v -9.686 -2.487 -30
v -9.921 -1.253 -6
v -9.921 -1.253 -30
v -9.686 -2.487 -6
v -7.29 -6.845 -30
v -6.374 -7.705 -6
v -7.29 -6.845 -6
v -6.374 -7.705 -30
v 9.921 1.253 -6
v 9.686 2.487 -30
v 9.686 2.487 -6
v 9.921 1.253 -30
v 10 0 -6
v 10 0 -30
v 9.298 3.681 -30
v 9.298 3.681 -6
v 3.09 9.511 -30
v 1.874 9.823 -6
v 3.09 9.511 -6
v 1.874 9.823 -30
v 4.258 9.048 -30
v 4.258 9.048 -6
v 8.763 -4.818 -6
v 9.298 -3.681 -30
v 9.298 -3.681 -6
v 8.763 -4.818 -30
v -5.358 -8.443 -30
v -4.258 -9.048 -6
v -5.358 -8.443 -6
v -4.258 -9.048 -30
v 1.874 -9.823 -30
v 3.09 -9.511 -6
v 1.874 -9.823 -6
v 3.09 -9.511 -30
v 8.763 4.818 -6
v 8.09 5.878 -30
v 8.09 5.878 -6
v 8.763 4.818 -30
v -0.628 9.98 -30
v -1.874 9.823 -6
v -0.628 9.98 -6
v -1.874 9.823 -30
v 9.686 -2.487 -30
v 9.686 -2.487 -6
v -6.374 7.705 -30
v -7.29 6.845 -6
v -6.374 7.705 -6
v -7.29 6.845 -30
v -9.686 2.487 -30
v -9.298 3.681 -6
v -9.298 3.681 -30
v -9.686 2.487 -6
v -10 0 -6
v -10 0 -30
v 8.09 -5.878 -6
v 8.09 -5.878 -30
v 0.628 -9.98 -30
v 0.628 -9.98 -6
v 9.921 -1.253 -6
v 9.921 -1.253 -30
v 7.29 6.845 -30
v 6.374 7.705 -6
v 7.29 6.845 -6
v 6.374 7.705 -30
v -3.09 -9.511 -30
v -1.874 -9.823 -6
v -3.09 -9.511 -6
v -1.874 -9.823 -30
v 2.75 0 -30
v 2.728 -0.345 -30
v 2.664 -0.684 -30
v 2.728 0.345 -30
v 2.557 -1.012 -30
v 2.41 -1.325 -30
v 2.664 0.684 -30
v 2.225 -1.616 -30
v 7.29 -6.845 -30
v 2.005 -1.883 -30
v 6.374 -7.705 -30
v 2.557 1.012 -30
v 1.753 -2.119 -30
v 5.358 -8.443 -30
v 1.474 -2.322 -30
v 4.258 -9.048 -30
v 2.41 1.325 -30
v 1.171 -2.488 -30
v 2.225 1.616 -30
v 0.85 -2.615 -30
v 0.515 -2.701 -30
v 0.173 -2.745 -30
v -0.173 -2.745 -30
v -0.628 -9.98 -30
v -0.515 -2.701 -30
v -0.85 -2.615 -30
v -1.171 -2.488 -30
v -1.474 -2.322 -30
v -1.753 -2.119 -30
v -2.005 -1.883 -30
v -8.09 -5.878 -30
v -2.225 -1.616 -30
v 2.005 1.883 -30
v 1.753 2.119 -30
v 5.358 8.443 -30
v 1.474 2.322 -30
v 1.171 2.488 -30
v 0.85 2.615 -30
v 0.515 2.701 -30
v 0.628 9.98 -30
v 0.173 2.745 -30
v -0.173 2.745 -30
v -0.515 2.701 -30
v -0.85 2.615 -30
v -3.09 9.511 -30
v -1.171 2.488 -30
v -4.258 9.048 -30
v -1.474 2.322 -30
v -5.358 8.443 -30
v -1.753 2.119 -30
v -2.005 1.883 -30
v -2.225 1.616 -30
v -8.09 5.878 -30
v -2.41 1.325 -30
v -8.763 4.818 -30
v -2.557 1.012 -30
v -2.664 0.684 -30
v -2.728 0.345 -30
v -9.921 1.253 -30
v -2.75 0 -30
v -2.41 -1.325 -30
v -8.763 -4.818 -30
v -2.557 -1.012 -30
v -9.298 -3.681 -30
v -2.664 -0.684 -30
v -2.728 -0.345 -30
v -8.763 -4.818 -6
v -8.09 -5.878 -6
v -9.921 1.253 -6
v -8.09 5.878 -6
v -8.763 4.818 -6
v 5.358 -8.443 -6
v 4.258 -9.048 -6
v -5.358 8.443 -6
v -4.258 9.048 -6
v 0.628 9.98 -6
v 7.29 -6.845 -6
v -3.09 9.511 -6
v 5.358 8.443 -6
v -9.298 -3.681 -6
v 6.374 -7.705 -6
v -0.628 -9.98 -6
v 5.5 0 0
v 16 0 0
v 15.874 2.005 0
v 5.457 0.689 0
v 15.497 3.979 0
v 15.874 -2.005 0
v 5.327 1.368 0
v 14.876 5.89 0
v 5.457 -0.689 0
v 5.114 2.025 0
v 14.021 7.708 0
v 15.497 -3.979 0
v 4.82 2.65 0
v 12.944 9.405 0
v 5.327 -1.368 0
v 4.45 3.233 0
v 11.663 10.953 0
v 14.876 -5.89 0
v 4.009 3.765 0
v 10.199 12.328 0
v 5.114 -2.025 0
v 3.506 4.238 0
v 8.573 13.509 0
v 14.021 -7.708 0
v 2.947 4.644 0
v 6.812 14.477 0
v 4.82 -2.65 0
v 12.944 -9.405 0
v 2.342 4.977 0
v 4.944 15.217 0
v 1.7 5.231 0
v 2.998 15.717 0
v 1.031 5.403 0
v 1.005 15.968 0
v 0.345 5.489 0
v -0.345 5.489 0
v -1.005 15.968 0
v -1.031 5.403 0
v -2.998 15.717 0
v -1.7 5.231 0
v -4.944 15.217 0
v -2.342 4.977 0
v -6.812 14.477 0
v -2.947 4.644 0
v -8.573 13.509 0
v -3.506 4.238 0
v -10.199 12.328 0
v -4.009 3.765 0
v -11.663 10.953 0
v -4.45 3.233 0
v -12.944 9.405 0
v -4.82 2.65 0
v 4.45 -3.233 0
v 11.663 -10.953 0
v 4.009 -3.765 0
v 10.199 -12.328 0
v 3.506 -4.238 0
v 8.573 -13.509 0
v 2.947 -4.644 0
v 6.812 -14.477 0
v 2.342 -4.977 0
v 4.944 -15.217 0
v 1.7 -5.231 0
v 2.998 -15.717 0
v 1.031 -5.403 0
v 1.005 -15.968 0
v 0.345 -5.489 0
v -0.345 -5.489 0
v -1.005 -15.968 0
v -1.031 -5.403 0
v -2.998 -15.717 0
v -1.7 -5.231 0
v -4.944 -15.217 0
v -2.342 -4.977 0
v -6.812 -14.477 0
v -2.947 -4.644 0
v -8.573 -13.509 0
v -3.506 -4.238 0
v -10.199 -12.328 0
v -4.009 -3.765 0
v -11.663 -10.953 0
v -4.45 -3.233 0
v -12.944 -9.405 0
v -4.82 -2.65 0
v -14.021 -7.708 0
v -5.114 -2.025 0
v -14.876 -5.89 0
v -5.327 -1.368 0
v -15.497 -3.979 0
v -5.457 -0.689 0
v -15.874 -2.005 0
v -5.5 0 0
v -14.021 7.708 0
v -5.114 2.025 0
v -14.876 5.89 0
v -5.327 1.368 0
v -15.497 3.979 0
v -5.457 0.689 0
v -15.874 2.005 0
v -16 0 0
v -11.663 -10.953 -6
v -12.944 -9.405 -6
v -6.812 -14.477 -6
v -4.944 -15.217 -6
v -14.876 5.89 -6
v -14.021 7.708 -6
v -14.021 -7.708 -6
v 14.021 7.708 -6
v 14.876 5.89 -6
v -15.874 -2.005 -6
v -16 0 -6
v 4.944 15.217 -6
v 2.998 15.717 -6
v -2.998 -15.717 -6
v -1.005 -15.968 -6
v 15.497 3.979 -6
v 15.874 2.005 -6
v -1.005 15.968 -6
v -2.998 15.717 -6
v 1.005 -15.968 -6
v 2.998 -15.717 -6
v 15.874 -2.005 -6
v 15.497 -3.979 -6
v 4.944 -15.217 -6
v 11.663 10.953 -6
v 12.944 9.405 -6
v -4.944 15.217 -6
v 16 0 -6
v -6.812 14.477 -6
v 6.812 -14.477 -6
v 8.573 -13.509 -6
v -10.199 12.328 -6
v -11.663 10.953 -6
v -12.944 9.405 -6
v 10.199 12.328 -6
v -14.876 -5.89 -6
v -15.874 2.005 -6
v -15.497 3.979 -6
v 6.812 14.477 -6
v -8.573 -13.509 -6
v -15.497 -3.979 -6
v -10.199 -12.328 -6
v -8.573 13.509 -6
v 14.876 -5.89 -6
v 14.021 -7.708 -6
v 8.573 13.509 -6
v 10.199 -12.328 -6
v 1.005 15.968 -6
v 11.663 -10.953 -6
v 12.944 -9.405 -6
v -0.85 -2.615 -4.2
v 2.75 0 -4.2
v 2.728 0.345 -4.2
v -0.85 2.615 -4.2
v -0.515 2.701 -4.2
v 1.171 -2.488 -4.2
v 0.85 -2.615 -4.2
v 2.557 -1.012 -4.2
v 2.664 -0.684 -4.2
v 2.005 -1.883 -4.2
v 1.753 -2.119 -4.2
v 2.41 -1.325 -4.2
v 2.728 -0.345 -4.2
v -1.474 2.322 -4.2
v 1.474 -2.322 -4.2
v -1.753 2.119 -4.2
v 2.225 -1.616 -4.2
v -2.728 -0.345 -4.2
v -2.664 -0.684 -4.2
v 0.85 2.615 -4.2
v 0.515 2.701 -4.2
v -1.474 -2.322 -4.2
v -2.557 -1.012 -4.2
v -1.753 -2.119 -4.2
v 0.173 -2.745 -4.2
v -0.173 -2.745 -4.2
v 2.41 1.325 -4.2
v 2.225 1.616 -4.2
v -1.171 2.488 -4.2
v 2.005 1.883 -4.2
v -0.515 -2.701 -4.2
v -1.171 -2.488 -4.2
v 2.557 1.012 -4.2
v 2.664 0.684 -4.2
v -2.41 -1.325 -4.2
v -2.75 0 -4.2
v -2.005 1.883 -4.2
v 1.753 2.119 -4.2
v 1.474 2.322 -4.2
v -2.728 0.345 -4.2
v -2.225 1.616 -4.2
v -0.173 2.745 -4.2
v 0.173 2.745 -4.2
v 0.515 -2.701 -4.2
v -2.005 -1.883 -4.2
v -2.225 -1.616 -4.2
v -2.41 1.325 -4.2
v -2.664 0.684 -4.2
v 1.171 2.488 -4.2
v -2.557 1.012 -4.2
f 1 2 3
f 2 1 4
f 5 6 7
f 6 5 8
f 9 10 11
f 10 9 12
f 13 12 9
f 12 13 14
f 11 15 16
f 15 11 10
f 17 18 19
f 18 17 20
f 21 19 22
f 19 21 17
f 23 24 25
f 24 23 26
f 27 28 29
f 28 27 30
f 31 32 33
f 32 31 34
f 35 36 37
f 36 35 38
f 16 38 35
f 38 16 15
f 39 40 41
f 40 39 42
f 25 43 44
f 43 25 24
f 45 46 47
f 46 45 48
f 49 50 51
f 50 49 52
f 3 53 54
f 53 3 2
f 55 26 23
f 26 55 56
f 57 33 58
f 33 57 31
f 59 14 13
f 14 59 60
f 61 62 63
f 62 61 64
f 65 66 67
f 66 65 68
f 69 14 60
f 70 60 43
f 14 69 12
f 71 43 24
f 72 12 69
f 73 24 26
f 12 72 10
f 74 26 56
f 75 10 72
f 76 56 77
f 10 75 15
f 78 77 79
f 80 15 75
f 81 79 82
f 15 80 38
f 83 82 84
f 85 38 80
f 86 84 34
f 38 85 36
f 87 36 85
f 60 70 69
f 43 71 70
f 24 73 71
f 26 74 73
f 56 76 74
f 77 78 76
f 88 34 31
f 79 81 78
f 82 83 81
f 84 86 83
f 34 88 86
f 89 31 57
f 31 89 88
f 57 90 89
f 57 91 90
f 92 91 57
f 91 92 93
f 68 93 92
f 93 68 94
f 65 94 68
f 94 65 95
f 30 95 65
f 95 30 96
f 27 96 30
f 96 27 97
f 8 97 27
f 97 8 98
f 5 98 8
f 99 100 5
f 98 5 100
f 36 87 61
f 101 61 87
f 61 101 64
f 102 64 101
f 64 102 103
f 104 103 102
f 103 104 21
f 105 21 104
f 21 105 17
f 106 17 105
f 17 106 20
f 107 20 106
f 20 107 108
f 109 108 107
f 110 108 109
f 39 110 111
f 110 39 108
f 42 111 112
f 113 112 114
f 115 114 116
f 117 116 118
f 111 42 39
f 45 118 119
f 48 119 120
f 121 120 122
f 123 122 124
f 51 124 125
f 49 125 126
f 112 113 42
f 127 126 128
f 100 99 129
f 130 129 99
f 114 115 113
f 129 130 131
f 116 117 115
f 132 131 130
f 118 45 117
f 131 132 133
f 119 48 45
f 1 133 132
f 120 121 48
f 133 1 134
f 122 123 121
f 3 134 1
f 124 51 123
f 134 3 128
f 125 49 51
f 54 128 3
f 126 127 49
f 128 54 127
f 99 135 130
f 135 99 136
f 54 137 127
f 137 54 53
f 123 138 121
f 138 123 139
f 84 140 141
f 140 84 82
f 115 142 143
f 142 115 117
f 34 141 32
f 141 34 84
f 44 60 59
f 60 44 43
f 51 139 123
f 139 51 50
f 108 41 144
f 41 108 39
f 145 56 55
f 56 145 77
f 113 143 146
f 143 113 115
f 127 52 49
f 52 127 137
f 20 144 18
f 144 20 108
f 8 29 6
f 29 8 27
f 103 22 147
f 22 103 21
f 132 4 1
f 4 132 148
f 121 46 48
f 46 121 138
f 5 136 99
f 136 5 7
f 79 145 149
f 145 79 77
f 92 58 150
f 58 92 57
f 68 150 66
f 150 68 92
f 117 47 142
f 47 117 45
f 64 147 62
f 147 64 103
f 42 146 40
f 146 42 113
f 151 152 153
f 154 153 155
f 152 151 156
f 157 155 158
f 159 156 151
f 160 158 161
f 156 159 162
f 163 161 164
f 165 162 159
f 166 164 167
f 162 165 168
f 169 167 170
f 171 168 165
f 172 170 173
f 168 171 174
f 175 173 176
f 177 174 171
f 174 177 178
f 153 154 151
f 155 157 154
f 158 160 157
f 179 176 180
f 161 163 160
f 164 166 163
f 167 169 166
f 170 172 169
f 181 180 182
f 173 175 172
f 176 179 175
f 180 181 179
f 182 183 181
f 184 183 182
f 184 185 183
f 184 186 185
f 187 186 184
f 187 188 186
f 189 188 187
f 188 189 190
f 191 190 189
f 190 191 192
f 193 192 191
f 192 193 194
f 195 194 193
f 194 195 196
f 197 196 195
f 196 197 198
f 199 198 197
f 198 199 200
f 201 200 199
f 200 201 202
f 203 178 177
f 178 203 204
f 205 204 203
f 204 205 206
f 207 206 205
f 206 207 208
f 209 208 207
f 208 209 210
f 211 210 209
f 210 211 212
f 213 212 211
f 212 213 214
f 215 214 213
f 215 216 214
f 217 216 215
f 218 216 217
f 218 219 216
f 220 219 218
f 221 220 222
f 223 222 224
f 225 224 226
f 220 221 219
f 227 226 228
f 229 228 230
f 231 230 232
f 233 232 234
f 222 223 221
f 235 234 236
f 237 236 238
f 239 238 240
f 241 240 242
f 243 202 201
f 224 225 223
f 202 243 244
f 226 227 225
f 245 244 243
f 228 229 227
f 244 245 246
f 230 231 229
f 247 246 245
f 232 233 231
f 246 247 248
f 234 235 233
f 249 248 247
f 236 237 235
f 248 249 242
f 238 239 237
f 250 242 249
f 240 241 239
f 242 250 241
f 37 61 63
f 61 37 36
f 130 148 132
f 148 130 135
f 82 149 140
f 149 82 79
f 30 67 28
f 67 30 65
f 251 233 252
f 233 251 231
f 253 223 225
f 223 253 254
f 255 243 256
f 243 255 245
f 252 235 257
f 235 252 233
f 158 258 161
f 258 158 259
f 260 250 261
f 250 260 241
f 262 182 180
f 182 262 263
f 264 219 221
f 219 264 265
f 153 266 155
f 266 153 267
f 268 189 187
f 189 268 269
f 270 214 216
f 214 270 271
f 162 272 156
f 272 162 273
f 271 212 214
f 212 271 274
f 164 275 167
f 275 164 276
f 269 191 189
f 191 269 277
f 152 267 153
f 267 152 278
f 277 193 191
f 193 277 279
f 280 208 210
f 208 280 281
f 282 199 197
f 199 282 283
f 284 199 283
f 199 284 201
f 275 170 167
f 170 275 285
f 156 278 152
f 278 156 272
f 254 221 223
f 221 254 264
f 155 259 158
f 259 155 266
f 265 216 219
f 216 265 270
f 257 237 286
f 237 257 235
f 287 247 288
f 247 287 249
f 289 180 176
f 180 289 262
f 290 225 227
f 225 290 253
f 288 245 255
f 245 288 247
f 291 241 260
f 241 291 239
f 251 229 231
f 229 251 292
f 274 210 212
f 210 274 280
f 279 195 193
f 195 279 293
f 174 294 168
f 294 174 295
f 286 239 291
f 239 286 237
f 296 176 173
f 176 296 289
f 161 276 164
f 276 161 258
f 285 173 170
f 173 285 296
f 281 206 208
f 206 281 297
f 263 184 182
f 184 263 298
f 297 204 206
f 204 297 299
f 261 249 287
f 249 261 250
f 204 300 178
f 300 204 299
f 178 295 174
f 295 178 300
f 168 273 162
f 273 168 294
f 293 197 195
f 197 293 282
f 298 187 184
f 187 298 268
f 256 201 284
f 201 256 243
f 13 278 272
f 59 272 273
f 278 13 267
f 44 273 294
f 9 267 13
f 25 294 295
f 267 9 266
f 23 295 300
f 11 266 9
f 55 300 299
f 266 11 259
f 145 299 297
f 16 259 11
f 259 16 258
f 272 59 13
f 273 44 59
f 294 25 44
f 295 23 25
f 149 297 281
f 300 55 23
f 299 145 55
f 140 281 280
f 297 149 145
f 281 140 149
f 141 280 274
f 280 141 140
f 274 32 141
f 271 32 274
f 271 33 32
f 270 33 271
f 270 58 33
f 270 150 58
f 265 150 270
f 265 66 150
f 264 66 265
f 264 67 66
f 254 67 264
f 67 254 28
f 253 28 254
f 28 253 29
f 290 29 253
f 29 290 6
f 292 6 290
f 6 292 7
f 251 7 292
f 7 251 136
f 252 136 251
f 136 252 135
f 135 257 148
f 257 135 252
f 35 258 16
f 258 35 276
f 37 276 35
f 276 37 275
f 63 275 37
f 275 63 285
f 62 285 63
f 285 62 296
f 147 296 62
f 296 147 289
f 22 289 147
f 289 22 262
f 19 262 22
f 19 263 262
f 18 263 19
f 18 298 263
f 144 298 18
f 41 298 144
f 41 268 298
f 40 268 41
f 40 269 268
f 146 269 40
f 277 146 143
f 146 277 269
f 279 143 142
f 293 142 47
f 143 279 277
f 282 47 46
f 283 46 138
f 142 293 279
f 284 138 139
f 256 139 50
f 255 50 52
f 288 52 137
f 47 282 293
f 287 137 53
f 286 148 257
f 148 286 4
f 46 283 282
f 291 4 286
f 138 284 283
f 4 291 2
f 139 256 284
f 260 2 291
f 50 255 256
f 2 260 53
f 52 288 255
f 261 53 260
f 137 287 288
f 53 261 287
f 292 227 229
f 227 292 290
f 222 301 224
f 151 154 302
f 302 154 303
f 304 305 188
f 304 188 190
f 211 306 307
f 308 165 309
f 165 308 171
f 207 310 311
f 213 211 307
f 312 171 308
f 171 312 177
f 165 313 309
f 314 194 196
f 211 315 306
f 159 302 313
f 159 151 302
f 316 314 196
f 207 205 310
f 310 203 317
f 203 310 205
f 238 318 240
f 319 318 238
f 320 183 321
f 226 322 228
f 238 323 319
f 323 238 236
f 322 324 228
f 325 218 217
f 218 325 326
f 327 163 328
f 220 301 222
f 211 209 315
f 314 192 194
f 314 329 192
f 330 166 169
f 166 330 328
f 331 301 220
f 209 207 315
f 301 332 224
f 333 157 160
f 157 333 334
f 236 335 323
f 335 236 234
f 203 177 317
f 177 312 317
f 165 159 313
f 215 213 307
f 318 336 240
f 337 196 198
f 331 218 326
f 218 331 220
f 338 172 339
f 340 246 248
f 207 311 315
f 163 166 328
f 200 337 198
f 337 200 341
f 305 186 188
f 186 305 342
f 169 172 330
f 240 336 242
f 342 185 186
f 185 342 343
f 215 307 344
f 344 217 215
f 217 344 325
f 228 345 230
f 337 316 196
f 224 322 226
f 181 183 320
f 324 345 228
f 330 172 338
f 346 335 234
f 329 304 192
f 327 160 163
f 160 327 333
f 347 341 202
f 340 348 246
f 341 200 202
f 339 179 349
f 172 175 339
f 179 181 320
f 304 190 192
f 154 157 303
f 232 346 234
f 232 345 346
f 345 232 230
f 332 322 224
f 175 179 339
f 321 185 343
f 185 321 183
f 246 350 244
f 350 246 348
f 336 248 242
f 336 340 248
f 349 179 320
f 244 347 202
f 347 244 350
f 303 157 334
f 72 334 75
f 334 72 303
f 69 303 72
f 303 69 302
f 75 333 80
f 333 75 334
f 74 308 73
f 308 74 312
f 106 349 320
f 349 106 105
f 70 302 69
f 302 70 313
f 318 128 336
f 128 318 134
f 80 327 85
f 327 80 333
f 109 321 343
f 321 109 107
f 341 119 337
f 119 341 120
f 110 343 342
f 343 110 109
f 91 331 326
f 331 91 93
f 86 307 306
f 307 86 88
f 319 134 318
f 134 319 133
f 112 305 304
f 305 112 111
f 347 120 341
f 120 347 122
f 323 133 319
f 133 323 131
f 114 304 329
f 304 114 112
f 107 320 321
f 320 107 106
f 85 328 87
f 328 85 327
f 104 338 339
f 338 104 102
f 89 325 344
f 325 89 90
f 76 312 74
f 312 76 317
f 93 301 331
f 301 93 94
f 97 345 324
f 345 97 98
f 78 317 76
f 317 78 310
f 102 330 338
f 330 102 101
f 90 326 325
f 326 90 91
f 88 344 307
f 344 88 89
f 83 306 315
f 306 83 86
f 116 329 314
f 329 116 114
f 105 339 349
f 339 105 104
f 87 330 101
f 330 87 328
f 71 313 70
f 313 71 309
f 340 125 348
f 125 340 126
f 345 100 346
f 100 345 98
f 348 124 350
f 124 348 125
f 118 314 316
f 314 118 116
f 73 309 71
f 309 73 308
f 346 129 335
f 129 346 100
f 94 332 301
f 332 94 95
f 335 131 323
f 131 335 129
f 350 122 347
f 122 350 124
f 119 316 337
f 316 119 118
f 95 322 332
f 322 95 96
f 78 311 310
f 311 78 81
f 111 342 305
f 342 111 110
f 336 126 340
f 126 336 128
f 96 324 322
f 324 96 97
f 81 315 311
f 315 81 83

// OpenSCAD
$fn = 50;


difference() {
	union() {
		translate(v = [0, 0, -30.0000000000]) {
			cylinder(h = 30, r = 10.0000000000);
		}
		translate(v = [0, 0, -6.0000000000]) {
			cylinder(h = 6, r = 16.0000000000);
		}
	}
	union() {
		translate(v = [0, 0, 0]) {
			rotate(a = [0, 0, 0]) {
				difference() {
					union() {
						#translate(v = [0, 0, -30.0000000000]) {
							cylinder(h = 30, r = 2.2500000000);
						}
						#translate(v = [0, 0, -4.2000000000]) {
							cylinder(h = 4.2000000000, r = 10.0000000000, r1 = 2.7500000000, r2 = 5.5000000000);
						}
						#translate(v = [0, 0, -30.0000000000]) {
							cylinder(h = 30, r = 2.7500000000);
						}
						#translate(v = [0, 0, -30.0000000000]) {
							cylinder(h = 30, r = 2.2500000000);
						}
					}
					union();
				}
			}
		}
	}
}
